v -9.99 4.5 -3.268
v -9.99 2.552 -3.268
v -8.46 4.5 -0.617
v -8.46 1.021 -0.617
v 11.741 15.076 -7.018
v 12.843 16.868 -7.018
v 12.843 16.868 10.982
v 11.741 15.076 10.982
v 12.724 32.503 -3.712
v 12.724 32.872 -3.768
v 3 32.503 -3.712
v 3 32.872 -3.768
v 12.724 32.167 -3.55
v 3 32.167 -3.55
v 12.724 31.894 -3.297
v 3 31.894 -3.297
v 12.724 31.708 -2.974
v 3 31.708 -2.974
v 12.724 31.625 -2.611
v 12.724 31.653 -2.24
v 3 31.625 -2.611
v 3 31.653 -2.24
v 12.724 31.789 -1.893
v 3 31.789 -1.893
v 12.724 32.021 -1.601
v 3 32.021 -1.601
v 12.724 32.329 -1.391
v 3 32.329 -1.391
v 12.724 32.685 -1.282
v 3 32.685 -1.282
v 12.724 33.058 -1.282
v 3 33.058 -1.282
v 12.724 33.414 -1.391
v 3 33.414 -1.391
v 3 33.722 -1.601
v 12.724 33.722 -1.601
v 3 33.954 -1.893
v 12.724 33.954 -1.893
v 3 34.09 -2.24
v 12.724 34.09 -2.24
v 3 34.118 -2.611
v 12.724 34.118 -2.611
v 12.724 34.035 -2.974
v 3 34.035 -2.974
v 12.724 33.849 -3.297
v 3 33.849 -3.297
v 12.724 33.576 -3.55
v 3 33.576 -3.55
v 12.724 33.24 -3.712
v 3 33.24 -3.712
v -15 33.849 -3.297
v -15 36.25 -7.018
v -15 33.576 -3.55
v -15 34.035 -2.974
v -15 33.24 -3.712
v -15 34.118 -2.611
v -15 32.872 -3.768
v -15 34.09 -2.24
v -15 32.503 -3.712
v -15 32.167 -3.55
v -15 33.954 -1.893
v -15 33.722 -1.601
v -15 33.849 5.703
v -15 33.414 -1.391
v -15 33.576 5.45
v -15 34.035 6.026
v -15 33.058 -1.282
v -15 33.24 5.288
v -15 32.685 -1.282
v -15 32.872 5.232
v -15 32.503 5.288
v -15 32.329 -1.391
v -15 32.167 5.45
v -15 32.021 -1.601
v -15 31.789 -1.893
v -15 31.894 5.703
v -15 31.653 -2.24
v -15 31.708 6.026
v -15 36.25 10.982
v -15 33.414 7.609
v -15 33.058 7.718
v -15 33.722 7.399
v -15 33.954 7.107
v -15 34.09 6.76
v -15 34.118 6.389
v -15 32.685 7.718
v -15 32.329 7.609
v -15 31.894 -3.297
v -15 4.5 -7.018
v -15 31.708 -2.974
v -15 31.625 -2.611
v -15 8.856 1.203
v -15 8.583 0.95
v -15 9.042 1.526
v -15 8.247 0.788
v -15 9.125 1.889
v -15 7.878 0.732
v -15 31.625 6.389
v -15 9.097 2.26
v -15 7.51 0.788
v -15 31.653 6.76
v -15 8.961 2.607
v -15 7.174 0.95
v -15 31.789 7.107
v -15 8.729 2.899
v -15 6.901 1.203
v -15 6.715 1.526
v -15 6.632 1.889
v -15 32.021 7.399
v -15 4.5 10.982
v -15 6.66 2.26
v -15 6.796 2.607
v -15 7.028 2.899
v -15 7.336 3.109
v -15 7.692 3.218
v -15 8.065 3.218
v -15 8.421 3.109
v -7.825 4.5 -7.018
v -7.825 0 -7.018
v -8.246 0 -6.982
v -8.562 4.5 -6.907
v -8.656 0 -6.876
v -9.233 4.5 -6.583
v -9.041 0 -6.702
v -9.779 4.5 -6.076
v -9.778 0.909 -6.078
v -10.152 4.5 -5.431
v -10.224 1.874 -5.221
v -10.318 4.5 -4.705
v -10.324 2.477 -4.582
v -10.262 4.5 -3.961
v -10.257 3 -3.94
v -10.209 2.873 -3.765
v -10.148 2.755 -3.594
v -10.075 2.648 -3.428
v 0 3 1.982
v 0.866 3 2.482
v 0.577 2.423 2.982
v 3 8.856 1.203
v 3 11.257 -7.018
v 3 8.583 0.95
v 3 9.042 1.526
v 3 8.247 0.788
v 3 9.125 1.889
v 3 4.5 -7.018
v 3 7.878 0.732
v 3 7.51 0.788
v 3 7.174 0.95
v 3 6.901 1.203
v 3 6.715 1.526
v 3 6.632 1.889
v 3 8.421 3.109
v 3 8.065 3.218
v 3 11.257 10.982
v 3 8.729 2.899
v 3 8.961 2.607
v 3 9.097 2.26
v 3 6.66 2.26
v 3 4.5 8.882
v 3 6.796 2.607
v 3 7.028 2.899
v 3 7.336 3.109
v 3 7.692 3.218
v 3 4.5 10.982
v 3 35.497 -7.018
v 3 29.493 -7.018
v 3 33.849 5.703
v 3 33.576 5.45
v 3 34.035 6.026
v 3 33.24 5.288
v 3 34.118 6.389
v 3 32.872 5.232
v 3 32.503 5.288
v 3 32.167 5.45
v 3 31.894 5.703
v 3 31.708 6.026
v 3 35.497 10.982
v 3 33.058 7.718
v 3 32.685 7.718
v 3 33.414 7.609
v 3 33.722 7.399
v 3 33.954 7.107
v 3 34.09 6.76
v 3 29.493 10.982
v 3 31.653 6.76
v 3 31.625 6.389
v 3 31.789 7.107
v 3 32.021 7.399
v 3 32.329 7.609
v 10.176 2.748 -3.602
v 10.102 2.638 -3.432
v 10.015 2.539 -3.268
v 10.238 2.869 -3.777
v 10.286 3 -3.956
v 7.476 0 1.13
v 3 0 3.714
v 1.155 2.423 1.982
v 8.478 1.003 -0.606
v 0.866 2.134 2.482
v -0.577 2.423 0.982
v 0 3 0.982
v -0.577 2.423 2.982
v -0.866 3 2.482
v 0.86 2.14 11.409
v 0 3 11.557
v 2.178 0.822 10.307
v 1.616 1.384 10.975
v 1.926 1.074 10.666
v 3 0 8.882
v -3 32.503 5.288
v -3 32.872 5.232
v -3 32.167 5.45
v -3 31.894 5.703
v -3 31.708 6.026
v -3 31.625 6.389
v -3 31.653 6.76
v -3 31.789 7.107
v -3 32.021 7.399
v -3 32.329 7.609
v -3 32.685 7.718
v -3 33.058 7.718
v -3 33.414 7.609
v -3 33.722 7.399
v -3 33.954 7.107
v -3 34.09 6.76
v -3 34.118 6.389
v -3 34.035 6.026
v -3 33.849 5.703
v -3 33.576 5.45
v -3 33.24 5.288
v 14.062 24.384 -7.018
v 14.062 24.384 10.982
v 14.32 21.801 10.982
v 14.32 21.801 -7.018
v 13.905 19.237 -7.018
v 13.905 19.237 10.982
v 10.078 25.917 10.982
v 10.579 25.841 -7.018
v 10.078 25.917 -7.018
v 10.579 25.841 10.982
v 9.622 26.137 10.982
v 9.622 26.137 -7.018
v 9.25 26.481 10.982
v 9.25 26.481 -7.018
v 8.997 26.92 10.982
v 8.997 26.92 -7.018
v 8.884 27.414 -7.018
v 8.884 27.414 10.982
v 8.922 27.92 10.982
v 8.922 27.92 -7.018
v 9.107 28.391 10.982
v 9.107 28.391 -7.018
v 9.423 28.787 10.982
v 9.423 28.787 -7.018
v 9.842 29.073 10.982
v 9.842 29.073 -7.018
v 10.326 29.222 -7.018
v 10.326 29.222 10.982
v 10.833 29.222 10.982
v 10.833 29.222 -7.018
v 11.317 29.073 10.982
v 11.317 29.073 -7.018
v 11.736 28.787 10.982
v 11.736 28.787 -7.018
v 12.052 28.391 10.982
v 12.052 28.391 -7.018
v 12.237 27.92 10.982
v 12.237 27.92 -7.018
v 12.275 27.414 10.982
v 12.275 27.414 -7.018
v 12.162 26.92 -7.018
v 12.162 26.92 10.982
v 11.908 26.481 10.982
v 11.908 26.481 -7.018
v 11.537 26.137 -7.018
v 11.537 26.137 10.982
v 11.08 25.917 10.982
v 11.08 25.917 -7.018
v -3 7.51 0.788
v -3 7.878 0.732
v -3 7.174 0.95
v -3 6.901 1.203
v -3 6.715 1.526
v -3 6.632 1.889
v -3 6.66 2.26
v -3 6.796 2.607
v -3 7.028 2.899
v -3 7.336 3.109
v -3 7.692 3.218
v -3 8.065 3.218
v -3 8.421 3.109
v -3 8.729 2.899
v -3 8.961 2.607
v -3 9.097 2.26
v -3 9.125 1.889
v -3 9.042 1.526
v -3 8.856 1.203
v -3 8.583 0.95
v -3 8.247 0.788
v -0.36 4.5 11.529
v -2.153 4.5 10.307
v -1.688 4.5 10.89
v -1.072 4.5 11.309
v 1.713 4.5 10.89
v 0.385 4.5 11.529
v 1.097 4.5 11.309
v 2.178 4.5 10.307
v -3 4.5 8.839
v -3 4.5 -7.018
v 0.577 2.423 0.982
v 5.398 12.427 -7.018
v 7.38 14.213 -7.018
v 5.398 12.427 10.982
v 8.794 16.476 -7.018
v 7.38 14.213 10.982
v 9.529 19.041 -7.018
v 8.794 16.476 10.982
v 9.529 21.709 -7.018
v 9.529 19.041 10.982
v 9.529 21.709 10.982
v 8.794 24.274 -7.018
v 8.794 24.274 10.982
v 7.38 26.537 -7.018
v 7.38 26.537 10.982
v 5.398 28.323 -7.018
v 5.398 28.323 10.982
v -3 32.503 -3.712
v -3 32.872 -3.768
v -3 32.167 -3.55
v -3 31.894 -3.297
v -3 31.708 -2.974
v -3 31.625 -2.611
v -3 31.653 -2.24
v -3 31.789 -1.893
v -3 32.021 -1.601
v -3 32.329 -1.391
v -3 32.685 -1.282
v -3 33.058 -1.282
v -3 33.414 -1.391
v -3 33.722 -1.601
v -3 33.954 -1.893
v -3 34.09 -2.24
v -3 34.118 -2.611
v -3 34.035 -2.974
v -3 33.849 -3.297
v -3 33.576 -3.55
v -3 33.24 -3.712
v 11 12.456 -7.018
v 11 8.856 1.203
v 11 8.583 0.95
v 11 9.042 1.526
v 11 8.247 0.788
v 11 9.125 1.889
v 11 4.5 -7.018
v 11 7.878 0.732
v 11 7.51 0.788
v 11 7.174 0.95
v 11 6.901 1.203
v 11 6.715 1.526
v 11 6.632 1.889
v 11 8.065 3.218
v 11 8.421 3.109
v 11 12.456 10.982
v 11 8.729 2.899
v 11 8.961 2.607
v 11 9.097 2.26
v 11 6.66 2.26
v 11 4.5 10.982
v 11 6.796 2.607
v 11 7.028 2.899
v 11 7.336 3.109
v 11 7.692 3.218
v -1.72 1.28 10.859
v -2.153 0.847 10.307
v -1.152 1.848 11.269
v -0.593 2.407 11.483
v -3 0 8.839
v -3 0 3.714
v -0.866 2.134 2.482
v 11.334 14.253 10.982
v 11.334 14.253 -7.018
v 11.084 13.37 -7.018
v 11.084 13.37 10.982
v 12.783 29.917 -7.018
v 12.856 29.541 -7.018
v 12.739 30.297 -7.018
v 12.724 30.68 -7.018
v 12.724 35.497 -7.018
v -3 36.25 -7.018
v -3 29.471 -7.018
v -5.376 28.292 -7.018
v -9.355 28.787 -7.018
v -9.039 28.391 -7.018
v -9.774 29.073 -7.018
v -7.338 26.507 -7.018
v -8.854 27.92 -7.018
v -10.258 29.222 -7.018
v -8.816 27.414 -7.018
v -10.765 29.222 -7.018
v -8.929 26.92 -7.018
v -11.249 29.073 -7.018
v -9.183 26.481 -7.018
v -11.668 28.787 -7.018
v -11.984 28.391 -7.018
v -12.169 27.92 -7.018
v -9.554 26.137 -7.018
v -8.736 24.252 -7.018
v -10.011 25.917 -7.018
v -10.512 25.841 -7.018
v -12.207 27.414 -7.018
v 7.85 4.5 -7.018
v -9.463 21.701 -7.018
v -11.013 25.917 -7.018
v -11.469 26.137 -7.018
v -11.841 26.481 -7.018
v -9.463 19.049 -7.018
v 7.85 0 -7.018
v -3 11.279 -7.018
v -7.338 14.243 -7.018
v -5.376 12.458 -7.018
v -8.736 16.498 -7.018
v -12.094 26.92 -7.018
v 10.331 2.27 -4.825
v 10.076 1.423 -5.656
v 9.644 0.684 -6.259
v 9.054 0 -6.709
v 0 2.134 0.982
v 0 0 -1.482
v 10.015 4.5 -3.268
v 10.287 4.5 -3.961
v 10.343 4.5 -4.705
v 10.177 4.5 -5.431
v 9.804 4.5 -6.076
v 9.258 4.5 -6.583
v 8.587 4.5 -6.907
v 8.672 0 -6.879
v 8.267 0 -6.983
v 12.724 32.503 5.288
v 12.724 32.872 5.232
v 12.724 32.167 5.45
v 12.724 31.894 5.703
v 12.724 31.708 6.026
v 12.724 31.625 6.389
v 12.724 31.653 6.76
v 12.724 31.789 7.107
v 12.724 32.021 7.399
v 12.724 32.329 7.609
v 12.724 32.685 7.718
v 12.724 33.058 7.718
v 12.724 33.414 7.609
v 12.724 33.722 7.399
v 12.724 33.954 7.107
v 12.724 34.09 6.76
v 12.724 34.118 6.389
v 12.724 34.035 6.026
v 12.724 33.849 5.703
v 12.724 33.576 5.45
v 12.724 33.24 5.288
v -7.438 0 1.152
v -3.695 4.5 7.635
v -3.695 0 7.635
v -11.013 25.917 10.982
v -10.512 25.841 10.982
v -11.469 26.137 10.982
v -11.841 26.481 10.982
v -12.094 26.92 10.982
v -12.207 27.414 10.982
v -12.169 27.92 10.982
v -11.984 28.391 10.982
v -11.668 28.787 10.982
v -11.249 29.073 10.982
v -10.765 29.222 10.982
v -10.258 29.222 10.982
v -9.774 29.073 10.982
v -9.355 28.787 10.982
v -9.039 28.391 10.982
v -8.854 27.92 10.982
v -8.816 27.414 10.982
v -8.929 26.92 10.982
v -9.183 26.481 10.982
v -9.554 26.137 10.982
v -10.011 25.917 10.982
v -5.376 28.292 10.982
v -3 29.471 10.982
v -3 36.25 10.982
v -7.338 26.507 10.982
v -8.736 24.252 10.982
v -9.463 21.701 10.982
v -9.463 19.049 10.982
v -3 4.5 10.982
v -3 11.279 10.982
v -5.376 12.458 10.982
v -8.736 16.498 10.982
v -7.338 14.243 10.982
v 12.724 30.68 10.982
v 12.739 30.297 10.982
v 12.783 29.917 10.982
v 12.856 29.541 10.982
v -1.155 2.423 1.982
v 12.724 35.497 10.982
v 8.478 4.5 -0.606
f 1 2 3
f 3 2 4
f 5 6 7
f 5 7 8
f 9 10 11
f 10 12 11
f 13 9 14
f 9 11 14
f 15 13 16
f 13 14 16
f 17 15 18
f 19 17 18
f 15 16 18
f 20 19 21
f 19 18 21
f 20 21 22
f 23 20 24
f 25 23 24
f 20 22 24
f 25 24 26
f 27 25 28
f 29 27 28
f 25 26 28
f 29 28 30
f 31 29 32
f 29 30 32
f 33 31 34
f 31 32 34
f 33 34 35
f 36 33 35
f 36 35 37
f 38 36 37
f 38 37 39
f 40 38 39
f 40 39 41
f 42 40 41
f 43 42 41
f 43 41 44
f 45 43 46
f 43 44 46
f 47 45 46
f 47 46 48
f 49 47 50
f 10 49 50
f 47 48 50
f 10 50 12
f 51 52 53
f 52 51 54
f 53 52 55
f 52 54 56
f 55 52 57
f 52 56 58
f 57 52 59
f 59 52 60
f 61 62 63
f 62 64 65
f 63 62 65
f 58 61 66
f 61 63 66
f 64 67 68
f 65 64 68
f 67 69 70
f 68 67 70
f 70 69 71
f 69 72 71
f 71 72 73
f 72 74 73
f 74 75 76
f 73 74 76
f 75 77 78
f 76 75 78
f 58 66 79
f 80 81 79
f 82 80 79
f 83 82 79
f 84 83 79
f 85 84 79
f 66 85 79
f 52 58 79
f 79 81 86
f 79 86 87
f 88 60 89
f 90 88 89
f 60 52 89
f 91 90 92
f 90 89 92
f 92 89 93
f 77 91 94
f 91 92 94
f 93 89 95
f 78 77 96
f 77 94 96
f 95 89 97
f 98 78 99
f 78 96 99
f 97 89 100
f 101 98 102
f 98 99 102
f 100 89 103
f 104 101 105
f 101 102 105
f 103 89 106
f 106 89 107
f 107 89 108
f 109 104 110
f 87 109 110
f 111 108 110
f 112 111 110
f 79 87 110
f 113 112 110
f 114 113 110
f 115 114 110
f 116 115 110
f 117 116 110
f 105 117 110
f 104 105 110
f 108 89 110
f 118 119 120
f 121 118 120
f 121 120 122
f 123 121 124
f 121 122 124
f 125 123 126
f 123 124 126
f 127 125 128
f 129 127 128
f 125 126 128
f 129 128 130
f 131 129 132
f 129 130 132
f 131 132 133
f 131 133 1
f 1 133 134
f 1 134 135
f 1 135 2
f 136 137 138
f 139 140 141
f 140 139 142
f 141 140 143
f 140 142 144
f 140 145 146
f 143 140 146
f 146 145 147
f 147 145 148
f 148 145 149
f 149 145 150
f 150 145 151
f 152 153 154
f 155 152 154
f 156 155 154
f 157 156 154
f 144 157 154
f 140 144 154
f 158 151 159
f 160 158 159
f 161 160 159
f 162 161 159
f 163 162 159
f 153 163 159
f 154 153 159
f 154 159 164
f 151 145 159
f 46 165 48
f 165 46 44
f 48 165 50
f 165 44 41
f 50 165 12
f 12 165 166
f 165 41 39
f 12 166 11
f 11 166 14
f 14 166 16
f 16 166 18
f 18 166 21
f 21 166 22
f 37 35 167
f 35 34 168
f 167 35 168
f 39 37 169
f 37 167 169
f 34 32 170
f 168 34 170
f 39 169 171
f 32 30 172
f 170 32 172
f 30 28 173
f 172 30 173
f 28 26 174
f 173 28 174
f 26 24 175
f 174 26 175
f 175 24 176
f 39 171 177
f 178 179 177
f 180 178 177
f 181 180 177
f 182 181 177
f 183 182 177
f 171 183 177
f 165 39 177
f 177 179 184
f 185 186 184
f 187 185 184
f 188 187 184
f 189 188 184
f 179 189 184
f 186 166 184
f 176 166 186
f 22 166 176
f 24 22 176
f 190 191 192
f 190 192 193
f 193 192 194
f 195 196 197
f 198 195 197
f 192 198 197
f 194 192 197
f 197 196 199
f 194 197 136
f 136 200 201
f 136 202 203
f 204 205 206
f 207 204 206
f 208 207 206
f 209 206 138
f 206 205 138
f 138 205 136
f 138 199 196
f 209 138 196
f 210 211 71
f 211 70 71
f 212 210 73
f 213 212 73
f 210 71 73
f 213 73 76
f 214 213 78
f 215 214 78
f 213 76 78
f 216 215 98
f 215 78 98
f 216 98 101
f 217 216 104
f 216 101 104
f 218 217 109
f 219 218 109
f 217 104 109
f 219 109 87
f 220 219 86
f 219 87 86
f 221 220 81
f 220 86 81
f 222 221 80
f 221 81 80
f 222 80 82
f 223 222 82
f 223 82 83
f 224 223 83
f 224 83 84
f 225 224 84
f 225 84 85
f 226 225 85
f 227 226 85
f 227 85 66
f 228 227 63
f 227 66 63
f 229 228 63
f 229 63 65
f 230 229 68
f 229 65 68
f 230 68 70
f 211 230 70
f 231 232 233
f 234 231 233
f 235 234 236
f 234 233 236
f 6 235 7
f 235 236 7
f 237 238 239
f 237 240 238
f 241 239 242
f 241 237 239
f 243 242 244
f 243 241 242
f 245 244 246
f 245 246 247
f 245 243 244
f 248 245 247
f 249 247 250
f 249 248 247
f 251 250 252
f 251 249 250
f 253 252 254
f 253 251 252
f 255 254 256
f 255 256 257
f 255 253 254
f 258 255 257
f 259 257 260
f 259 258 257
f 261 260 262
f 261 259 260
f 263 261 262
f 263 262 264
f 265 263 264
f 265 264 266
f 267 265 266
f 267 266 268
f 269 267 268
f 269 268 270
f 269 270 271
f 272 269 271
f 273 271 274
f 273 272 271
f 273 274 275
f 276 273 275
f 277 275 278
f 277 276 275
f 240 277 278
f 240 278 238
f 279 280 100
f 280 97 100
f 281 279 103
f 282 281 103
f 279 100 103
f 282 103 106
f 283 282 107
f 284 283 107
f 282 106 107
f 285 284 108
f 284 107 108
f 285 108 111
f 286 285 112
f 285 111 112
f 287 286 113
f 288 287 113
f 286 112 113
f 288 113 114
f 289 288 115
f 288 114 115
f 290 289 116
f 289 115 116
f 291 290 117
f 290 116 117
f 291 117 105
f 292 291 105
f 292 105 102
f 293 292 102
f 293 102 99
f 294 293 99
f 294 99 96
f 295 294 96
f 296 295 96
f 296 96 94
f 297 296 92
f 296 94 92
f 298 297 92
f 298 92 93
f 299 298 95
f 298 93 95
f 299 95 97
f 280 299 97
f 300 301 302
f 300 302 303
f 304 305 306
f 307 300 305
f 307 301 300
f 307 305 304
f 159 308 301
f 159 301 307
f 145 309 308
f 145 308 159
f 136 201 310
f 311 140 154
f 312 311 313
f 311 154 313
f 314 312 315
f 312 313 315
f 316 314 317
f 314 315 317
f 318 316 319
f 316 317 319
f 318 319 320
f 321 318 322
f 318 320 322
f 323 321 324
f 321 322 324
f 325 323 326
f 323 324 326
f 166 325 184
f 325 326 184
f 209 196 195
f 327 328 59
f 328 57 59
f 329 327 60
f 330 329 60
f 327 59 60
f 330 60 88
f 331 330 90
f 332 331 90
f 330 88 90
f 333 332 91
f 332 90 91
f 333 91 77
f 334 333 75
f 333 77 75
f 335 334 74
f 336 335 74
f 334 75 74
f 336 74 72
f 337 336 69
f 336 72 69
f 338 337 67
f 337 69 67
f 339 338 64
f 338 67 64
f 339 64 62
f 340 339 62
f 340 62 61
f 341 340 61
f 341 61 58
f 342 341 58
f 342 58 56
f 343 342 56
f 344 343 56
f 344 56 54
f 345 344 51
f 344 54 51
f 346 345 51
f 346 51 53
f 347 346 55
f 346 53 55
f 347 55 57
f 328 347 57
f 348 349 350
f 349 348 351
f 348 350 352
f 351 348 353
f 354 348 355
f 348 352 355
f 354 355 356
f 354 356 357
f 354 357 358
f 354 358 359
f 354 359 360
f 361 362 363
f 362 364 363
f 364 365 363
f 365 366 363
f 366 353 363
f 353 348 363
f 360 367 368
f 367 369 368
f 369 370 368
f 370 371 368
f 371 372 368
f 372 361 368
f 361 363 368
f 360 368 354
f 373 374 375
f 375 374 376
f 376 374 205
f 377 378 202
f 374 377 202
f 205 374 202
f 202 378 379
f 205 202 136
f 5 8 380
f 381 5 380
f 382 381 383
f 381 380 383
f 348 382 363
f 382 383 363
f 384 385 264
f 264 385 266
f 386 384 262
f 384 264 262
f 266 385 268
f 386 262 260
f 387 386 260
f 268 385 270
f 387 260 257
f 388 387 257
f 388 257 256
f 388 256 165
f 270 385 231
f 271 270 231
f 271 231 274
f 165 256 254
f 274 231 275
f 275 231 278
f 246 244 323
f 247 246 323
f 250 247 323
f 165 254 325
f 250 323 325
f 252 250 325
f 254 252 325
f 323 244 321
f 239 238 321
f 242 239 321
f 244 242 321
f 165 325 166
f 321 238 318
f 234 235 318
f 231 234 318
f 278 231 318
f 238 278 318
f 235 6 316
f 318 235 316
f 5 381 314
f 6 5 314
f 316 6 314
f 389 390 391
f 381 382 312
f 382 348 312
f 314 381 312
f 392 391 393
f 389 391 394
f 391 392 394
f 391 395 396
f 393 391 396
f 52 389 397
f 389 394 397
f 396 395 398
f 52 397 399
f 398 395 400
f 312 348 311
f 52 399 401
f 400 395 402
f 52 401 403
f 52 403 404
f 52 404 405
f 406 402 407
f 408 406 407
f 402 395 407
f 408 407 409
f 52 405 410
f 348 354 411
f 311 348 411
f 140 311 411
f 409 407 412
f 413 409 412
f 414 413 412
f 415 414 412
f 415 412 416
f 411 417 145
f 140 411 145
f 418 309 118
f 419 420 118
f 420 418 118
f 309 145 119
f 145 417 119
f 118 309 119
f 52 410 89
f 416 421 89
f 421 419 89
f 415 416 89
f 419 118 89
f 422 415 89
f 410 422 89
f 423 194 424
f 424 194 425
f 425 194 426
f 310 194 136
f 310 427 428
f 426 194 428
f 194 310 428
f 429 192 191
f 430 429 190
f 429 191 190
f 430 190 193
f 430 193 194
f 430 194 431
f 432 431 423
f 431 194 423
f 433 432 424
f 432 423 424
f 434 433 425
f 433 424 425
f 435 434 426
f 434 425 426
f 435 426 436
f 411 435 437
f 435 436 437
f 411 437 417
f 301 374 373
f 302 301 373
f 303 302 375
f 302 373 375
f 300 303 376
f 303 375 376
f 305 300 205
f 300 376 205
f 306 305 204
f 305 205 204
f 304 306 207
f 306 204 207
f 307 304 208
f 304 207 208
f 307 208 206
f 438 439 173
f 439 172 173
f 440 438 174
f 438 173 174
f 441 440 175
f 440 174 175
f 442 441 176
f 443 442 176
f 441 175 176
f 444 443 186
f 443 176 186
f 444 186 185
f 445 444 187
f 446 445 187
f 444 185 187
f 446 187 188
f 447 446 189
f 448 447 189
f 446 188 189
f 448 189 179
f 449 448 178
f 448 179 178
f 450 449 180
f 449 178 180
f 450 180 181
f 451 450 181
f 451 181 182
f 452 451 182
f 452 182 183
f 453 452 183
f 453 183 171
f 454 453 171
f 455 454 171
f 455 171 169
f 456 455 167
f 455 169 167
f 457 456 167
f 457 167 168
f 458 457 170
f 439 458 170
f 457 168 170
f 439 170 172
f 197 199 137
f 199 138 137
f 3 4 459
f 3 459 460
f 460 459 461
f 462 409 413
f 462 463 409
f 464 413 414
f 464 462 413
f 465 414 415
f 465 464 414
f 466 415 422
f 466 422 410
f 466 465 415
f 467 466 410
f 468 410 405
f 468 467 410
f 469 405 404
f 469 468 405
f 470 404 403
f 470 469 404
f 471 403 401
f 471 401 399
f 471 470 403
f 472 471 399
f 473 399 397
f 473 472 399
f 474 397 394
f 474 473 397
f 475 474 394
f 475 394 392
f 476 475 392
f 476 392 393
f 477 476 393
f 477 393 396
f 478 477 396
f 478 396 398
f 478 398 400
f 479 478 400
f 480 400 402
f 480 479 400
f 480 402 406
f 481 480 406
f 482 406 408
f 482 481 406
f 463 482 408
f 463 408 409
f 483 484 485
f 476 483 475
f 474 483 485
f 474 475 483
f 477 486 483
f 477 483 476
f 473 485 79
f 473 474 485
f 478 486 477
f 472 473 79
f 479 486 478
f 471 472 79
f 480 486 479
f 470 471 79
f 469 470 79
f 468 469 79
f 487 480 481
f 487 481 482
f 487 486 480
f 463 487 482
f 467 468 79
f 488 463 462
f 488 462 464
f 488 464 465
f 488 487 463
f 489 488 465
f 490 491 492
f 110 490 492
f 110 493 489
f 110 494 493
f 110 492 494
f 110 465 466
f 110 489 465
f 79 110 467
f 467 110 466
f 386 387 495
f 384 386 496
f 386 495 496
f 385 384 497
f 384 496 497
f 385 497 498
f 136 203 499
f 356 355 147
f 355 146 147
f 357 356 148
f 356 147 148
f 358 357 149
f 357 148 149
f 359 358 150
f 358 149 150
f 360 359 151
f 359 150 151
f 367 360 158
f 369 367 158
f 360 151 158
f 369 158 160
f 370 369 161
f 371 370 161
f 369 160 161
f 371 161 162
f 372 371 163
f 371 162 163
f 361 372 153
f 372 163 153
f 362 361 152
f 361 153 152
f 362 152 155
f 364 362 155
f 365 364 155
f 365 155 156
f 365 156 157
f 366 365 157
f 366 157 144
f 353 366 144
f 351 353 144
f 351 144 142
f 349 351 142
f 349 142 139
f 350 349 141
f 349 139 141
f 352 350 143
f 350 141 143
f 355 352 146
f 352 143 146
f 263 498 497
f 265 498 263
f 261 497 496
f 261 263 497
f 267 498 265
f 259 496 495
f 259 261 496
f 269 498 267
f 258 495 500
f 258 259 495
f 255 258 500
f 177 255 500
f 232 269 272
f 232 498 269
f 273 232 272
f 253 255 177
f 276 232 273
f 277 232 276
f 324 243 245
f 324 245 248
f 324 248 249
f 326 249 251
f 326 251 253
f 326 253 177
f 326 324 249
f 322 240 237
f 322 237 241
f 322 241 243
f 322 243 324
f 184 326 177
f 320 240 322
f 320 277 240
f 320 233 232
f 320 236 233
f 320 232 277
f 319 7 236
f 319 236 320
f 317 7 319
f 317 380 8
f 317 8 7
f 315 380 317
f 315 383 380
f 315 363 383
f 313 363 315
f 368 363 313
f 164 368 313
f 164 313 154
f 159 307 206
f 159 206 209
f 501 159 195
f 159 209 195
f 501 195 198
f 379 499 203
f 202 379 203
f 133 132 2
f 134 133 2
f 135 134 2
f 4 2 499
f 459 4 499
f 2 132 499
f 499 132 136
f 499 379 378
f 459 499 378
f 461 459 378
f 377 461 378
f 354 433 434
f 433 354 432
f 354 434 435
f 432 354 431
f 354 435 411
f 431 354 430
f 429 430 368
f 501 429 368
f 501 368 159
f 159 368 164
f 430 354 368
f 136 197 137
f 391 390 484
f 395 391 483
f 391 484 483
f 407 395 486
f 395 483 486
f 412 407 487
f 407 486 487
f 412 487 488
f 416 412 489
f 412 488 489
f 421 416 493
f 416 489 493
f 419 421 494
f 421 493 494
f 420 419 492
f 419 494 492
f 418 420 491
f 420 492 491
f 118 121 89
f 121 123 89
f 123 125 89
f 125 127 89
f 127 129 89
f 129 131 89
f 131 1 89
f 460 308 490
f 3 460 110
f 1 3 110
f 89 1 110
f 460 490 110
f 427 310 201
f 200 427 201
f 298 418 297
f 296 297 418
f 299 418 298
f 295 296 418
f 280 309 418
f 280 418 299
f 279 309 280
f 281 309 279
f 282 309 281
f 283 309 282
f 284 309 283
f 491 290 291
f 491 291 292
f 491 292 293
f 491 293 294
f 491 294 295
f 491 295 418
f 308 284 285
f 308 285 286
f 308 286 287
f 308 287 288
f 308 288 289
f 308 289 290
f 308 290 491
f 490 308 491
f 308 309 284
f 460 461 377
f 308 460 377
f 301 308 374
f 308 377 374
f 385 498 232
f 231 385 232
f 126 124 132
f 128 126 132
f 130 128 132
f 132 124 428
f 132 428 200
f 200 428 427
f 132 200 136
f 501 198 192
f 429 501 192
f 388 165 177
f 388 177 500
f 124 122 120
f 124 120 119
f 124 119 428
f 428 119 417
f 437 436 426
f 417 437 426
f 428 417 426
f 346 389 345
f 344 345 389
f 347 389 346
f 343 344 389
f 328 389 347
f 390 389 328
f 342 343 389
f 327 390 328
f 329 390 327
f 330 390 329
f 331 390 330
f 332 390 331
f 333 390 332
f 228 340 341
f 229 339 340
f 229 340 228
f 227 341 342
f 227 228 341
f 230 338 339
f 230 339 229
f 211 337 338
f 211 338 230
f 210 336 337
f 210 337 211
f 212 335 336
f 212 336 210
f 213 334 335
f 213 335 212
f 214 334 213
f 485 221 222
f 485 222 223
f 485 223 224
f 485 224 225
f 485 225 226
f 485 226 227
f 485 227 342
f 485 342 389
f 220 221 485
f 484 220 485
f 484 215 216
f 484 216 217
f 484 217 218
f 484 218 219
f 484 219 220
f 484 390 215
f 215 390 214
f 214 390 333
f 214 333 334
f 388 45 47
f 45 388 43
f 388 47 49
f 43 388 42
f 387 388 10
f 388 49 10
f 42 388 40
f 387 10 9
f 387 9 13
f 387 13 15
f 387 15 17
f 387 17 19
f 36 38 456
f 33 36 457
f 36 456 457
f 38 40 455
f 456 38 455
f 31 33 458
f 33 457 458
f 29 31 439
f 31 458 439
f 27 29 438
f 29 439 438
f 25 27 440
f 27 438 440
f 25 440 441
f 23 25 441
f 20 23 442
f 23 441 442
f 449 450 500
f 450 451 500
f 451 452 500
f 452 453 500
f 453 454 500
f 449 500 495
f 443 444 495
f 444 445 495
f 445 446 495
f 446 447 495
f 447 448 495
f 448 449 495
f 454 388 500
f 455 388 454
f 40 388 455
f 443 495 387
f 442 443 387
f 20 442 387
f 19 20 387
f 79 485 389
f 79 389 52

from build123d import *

# Parameters (mm, degrees)
SKETCH2_W                      = 12
SKETCH2_H                      = 18
EXTRUDE1_DEPTH                 = 31.75
EXTRUDE1_2_DEPTH               = 31.75
SKETCH4_R                      = 9.5885
MAGNET_CAVITY_DEPTH            = 44.163207712
SKETCH18_W                     = 1.25
SKETCH18_H                     = 30
M3X0_5_TAPPED_HOLE1_AT_2_COUNT = 2
M3X0_5_TAPPED_HOLE1_AT_2_PITCH = 9
M3X0_5_TAPPED_HOLE1_AT_3_COUNT = 2
M3X0_5_TAPPED_HOLE1_AT_3_PITCH = 25.395037131
M3_CLEARANCE_HOLE1_AT_2_COUNT  = 2
M3_CLEARANCE_HOLE1_AT_2_PITCH  = 21.091007592
EXTRUDE3_DEPTH                 = 44.163207712
EXTRUDE5_DEPTH                 = 4.5
EXTRUDE8_START                 = -8
EXTRUDE8_DEPTH                 = 36.406015976
CIRPATTERN1_COUNT              = 3


with BuildPart() as part:
    # Sketch2 → Extrude1 (new body)
    with BuildSketch(Plane(origin=(0, 4.5, 0), x_dir=(-1, 0, 0), z_dir=(0, 1, 0))):
        with Locations((9, 1.982307478)):
            Rectangle(SKETCH2_W, SKETCH2_H)
    extrude(amount=EXTRUDE1_DEPTH)


with BuildPart() as body_2:
    # Sketch2 → Extrude1 2 (new body)
    with BuildSketch(Plane(origin=(0, 4.5, 0), x_dir=(-1, 0, 0), z_dir=(0, 1, 0))):
        with Locations((-9, 1.982307478)):
            Rectangle(SKETCH2_W, SKETCH2_H)
    extrude(amount=EXTRUDE1_2_DEPTH)


with BuildPart() as magnet_cavity_tool:
    # Sketch4 → Magnet Cavity (new, through all)
    with BuildSketch(Plane.XY.offset(10.982307478)):
        with Locations((0.033766691, 20.375)):
            Circle(SKETCH4_R)
    extrude(amount=-MAGNET_CAVITY_DEPTH)


with BuildPart() as part_1:
    add(part.part)

    # Magnet Cavity: cut by magnet_cavity_tool
    add(magnet_cavity_tool.part, mode=Mode.SUBTRACT)


with BuildPart() as body_2_1:
    add(body_2.part)

    # Magnet Cavity: cut by magnet_cavity_tool
    add(magnet_cavity_tool.part, mode=Mode.SUBTRACT)


with BuildPart() as m3x0_5_tapped_hole1_tool:
    # Sketch18 → M3x0.5 Tapped Hole1 (revolve)
    with BuildSketch(Plane(origin=(15, 32.871578641, 6.482307478), x_dir=(0, 0, -1), z_dir=(0, 1, 0))):
        with Locations((0.625, 15)):
            Rectangle(SKETCH18_W, SKETCH18_H)
    m3x0_5_tapped_hole1 = revolve(axis=Axis((21.35, 32.871578641, 6.482307478), (-1, 0, 0)))


with BuildPart() as part_2:
    add(part_1.part)

    # M3x0.5 Tapped Hole1: cut by m3x0_5_tapped_hole1_tool
    add(m3x0_5_tapped_hole1_tool.part, mode=Mode.SUBTRACT)


with BuildPart() as body_2_2:
    add(body_2_1.part)

    # M3x0.5 Tapped Hole1: cut by m3x0_5_tapped_hole1_tool
    add(m3x0_5_tapped_hole1_tool.part, mode=Mode.SUBTRACT)


with BuildPart() as m3x0_5_tapped_hole1_at_2_tool:
    # M3x0.5 Tapped Hole1 at 2: M3x0.5 Tapped Hole1 ×2
    with Locations(*[(0, 0, -i * M3X0_5_TAPPED_HOLE1_AT_2_PITCH) for i in range(1, M3X0_5_TAPPED_HOLE1_AT_2_COUNT)]):
        add(m3x0_5_tapped_hole1)


with BuildPart() as part_3:
    add(part_2.part)

    # M3x0.5 Tapped Hole1 at 2: cut by m3x0_5_tapped_hole1_at_2_tool
    add(m3x0_5_tapped_hole1_at_2_tool.part, mode=Mode.SUBTRACT)


with BuildPart() as body_2_3:
    add(body_2_2.part)

    # M3x0.5 Tapped Hole1 at 2: cut by m3x0_5_tapped_hole1_at_2_tool
    add(m3x0_5_tapped_hole1_at_2_tool.part, mode=Mode.SUBTRACT)


with BuildPart() as m3x0_5_tapped_hole1_at_3_tool:
    # M3x0.5 Tapped Hole1 at 3: M3x0.5 Tapped Hole1 ×2
    with Locations(*[Vector(0, -0.984174866621225, -0.1771999771757721) * (i * M3X0_5_TAPPED_HOLE1_AT_3_PITCH) for i in range(1, M3X0_5_TAPPED_HOLE1_AT_3_COUNT)]):
        add(m3x0_5_tapped_hole1)


with BuildPart() as part_4:
    add(part_3.part)

    # M3x0.5 Tapped Hole1 at 3: cut by m3x0_5_tapped_hole1_at_3_tool
    add(m3x0_5_tapped_hole1_at_3_tool.part, mode=Mode.SUBTRACT)

    # Sketch24 → M3 Clearance Hole1 (revolve, cut)
    with BuildSketch(Plane(origin=(-10.511737105, 27.54122981, 10.982307478), x_dir=(0, -1, 0), z_dir=(1, 0, 0))):
        Polygon((0, 0), (0, 19.021463052), (1.7, 18), (1.7, 0), align=None)
    m3_clearance_hole1 = revolve(axis=Axis((-10.511737105, 27.54122981, 17.332307478), (0, 0, -1)), mode=Mode.SUBTRACT)



with BuildPart() as body_2_4:
    add(body_2_3.part)

    # M3x0.5 Tapped Hole1 at 3: cut by m3x0_5_tapped_hole1_at_3_tool
    add(m3x0_5_tapped_hole1_at_3_tool.part, mode=Mode.SUBTRACT)

    # M3 Clearance Hole1 at 2: M3 Clearance Hole1 ×2
    with Locations(*[(i * M3_CLEARANCE_HOLE1_AT_2_PITCH, 0, 0) for i in range(1, M3_CLEARANCE_HOLE1_AT_2_COUNT)]):
        add(m3_clearance_hole1, mode=Mode.SUBTRACT)

    # Trim Sketch → Extrude3 (cut, through all)
    with BuildSketch(Plane.XY.offset(10.982307478)):
        with BuildLine():
            Line((11, 12.456391912), (11, 4.5))
            Line((11, 4.5), (15, 4.5))
            Line((15, 4.5), (15, 36.25))
            Line((15, 36.25), (3, 36.25))
            Line((3, 36.25), (3, 35.497310661))
            Line((3, 35.497310661), (12.724200068, 35.497310661))
            Line((12.724200068, 35.497310661), (12.724200068, 30.679595884))
            ThreePointArc((12.724200068, 30.679595884), (12.757175017, 30.10630526), (12.855664924, 29.540576328))
            Line((12.855664924, 29.540576328), (14.062015368, 24.384247359))
            ThreePointArc((14.062015368, 24.384247359), (14.195982577, 20.505390111), (12.843027952, 16.867671794))
            Line((12.843027952, 16.867671794), (11.740958564, 15.075660139))
            ThreePointArc((11.740958564, 15.075660139), (11.188804349, 13.817419615), (11, 12.456391912))
        make_face()
    extrude(amount=-EXTRUDE3_DEPTH, mode=Mode.SUBTRACT)


with BuildPart() as part_5:
    add(part_4.part)

    add(body_2_4.part)  # Extrude5 merges body 2
    # Sketch1 → Extrude5 (add)
    with BuildSketch(Plane(origin=(0, 0, 0), x_dir=(1, 0, 0), z_dir=(0, 1, 0))):
        with BuildLine():
            Line((-9.989936491, 3.267692522), (-8.459547932, 0.616981784))
            Line((-8.459547932, 0.616981784), (-3.695452068, -7.634674306))
            Line((-3.695452068, -7.634674306), (-2.152576018, -10.307014014))
            ThreePointArc((-2.152576018, -10.307014014), (0.012487492, -11.557014014), (2.177551001, -10.307014014))
            Line((2.177551001, -10.307014014), (8.47827917, 0.606167299))
            Line((8.47827917, 0.606167299), (10.014911474, 3.267692522))
            ThreePointArc((10.014911474, 3.267692522), (10.014911474, 5.767692522), (7.849847964, 7.017692522))
            Line((7.849847964, 7.017692522), (4.764095865, 7.017692522))
            Line((4.764095865, 7.017692522), (-4.764095865, 7.017692522))
            Line((-4.764095865, 7.017692522), (-7.824872981, 7.017692522))
            ThreePointArc((-7.824872981, 7.017692522), (-9.989936491, 5.767692522), (-9.989936491, 3.267692522))
        make_face()
    extrude(amount=EXTRUDE5_DEPTH)

    # Sketch29 → Extrude8 (cut, through all)
    with BuildSketch(Plane(origin=(0, 0, -7.017692522), x_dir=(-1, 0, 0), z_dir=(0, 0, -1)).offset(EXTRUDE8_START)):
        Polygon((67.30851185, -64.30851185), (3, 0), (0, 3), (-3, 0), (-67.30851185, -64.30851185), (-67.30851185, -246.200451118), (67.30851185, -246.200451118), align=None)
    extrude8 = extrude(amount=-EXTRUDE8_DEPTH, mode=Mode.SUBTRACT)

    # CirPattern1: Extrude8 ×3 about axis
    cirpattern1_axis = Axis((0, 0, 1.982307478), (0, 1, 0))
    for i in range(1, CIRPATTERN1_COUNT):
        add(extrude8.rotate(cirpattern1_axis, i * 360 / CIRPATTERN1_COUNT), mode=Mode.SUBTRACT)


solid = part_5.part
